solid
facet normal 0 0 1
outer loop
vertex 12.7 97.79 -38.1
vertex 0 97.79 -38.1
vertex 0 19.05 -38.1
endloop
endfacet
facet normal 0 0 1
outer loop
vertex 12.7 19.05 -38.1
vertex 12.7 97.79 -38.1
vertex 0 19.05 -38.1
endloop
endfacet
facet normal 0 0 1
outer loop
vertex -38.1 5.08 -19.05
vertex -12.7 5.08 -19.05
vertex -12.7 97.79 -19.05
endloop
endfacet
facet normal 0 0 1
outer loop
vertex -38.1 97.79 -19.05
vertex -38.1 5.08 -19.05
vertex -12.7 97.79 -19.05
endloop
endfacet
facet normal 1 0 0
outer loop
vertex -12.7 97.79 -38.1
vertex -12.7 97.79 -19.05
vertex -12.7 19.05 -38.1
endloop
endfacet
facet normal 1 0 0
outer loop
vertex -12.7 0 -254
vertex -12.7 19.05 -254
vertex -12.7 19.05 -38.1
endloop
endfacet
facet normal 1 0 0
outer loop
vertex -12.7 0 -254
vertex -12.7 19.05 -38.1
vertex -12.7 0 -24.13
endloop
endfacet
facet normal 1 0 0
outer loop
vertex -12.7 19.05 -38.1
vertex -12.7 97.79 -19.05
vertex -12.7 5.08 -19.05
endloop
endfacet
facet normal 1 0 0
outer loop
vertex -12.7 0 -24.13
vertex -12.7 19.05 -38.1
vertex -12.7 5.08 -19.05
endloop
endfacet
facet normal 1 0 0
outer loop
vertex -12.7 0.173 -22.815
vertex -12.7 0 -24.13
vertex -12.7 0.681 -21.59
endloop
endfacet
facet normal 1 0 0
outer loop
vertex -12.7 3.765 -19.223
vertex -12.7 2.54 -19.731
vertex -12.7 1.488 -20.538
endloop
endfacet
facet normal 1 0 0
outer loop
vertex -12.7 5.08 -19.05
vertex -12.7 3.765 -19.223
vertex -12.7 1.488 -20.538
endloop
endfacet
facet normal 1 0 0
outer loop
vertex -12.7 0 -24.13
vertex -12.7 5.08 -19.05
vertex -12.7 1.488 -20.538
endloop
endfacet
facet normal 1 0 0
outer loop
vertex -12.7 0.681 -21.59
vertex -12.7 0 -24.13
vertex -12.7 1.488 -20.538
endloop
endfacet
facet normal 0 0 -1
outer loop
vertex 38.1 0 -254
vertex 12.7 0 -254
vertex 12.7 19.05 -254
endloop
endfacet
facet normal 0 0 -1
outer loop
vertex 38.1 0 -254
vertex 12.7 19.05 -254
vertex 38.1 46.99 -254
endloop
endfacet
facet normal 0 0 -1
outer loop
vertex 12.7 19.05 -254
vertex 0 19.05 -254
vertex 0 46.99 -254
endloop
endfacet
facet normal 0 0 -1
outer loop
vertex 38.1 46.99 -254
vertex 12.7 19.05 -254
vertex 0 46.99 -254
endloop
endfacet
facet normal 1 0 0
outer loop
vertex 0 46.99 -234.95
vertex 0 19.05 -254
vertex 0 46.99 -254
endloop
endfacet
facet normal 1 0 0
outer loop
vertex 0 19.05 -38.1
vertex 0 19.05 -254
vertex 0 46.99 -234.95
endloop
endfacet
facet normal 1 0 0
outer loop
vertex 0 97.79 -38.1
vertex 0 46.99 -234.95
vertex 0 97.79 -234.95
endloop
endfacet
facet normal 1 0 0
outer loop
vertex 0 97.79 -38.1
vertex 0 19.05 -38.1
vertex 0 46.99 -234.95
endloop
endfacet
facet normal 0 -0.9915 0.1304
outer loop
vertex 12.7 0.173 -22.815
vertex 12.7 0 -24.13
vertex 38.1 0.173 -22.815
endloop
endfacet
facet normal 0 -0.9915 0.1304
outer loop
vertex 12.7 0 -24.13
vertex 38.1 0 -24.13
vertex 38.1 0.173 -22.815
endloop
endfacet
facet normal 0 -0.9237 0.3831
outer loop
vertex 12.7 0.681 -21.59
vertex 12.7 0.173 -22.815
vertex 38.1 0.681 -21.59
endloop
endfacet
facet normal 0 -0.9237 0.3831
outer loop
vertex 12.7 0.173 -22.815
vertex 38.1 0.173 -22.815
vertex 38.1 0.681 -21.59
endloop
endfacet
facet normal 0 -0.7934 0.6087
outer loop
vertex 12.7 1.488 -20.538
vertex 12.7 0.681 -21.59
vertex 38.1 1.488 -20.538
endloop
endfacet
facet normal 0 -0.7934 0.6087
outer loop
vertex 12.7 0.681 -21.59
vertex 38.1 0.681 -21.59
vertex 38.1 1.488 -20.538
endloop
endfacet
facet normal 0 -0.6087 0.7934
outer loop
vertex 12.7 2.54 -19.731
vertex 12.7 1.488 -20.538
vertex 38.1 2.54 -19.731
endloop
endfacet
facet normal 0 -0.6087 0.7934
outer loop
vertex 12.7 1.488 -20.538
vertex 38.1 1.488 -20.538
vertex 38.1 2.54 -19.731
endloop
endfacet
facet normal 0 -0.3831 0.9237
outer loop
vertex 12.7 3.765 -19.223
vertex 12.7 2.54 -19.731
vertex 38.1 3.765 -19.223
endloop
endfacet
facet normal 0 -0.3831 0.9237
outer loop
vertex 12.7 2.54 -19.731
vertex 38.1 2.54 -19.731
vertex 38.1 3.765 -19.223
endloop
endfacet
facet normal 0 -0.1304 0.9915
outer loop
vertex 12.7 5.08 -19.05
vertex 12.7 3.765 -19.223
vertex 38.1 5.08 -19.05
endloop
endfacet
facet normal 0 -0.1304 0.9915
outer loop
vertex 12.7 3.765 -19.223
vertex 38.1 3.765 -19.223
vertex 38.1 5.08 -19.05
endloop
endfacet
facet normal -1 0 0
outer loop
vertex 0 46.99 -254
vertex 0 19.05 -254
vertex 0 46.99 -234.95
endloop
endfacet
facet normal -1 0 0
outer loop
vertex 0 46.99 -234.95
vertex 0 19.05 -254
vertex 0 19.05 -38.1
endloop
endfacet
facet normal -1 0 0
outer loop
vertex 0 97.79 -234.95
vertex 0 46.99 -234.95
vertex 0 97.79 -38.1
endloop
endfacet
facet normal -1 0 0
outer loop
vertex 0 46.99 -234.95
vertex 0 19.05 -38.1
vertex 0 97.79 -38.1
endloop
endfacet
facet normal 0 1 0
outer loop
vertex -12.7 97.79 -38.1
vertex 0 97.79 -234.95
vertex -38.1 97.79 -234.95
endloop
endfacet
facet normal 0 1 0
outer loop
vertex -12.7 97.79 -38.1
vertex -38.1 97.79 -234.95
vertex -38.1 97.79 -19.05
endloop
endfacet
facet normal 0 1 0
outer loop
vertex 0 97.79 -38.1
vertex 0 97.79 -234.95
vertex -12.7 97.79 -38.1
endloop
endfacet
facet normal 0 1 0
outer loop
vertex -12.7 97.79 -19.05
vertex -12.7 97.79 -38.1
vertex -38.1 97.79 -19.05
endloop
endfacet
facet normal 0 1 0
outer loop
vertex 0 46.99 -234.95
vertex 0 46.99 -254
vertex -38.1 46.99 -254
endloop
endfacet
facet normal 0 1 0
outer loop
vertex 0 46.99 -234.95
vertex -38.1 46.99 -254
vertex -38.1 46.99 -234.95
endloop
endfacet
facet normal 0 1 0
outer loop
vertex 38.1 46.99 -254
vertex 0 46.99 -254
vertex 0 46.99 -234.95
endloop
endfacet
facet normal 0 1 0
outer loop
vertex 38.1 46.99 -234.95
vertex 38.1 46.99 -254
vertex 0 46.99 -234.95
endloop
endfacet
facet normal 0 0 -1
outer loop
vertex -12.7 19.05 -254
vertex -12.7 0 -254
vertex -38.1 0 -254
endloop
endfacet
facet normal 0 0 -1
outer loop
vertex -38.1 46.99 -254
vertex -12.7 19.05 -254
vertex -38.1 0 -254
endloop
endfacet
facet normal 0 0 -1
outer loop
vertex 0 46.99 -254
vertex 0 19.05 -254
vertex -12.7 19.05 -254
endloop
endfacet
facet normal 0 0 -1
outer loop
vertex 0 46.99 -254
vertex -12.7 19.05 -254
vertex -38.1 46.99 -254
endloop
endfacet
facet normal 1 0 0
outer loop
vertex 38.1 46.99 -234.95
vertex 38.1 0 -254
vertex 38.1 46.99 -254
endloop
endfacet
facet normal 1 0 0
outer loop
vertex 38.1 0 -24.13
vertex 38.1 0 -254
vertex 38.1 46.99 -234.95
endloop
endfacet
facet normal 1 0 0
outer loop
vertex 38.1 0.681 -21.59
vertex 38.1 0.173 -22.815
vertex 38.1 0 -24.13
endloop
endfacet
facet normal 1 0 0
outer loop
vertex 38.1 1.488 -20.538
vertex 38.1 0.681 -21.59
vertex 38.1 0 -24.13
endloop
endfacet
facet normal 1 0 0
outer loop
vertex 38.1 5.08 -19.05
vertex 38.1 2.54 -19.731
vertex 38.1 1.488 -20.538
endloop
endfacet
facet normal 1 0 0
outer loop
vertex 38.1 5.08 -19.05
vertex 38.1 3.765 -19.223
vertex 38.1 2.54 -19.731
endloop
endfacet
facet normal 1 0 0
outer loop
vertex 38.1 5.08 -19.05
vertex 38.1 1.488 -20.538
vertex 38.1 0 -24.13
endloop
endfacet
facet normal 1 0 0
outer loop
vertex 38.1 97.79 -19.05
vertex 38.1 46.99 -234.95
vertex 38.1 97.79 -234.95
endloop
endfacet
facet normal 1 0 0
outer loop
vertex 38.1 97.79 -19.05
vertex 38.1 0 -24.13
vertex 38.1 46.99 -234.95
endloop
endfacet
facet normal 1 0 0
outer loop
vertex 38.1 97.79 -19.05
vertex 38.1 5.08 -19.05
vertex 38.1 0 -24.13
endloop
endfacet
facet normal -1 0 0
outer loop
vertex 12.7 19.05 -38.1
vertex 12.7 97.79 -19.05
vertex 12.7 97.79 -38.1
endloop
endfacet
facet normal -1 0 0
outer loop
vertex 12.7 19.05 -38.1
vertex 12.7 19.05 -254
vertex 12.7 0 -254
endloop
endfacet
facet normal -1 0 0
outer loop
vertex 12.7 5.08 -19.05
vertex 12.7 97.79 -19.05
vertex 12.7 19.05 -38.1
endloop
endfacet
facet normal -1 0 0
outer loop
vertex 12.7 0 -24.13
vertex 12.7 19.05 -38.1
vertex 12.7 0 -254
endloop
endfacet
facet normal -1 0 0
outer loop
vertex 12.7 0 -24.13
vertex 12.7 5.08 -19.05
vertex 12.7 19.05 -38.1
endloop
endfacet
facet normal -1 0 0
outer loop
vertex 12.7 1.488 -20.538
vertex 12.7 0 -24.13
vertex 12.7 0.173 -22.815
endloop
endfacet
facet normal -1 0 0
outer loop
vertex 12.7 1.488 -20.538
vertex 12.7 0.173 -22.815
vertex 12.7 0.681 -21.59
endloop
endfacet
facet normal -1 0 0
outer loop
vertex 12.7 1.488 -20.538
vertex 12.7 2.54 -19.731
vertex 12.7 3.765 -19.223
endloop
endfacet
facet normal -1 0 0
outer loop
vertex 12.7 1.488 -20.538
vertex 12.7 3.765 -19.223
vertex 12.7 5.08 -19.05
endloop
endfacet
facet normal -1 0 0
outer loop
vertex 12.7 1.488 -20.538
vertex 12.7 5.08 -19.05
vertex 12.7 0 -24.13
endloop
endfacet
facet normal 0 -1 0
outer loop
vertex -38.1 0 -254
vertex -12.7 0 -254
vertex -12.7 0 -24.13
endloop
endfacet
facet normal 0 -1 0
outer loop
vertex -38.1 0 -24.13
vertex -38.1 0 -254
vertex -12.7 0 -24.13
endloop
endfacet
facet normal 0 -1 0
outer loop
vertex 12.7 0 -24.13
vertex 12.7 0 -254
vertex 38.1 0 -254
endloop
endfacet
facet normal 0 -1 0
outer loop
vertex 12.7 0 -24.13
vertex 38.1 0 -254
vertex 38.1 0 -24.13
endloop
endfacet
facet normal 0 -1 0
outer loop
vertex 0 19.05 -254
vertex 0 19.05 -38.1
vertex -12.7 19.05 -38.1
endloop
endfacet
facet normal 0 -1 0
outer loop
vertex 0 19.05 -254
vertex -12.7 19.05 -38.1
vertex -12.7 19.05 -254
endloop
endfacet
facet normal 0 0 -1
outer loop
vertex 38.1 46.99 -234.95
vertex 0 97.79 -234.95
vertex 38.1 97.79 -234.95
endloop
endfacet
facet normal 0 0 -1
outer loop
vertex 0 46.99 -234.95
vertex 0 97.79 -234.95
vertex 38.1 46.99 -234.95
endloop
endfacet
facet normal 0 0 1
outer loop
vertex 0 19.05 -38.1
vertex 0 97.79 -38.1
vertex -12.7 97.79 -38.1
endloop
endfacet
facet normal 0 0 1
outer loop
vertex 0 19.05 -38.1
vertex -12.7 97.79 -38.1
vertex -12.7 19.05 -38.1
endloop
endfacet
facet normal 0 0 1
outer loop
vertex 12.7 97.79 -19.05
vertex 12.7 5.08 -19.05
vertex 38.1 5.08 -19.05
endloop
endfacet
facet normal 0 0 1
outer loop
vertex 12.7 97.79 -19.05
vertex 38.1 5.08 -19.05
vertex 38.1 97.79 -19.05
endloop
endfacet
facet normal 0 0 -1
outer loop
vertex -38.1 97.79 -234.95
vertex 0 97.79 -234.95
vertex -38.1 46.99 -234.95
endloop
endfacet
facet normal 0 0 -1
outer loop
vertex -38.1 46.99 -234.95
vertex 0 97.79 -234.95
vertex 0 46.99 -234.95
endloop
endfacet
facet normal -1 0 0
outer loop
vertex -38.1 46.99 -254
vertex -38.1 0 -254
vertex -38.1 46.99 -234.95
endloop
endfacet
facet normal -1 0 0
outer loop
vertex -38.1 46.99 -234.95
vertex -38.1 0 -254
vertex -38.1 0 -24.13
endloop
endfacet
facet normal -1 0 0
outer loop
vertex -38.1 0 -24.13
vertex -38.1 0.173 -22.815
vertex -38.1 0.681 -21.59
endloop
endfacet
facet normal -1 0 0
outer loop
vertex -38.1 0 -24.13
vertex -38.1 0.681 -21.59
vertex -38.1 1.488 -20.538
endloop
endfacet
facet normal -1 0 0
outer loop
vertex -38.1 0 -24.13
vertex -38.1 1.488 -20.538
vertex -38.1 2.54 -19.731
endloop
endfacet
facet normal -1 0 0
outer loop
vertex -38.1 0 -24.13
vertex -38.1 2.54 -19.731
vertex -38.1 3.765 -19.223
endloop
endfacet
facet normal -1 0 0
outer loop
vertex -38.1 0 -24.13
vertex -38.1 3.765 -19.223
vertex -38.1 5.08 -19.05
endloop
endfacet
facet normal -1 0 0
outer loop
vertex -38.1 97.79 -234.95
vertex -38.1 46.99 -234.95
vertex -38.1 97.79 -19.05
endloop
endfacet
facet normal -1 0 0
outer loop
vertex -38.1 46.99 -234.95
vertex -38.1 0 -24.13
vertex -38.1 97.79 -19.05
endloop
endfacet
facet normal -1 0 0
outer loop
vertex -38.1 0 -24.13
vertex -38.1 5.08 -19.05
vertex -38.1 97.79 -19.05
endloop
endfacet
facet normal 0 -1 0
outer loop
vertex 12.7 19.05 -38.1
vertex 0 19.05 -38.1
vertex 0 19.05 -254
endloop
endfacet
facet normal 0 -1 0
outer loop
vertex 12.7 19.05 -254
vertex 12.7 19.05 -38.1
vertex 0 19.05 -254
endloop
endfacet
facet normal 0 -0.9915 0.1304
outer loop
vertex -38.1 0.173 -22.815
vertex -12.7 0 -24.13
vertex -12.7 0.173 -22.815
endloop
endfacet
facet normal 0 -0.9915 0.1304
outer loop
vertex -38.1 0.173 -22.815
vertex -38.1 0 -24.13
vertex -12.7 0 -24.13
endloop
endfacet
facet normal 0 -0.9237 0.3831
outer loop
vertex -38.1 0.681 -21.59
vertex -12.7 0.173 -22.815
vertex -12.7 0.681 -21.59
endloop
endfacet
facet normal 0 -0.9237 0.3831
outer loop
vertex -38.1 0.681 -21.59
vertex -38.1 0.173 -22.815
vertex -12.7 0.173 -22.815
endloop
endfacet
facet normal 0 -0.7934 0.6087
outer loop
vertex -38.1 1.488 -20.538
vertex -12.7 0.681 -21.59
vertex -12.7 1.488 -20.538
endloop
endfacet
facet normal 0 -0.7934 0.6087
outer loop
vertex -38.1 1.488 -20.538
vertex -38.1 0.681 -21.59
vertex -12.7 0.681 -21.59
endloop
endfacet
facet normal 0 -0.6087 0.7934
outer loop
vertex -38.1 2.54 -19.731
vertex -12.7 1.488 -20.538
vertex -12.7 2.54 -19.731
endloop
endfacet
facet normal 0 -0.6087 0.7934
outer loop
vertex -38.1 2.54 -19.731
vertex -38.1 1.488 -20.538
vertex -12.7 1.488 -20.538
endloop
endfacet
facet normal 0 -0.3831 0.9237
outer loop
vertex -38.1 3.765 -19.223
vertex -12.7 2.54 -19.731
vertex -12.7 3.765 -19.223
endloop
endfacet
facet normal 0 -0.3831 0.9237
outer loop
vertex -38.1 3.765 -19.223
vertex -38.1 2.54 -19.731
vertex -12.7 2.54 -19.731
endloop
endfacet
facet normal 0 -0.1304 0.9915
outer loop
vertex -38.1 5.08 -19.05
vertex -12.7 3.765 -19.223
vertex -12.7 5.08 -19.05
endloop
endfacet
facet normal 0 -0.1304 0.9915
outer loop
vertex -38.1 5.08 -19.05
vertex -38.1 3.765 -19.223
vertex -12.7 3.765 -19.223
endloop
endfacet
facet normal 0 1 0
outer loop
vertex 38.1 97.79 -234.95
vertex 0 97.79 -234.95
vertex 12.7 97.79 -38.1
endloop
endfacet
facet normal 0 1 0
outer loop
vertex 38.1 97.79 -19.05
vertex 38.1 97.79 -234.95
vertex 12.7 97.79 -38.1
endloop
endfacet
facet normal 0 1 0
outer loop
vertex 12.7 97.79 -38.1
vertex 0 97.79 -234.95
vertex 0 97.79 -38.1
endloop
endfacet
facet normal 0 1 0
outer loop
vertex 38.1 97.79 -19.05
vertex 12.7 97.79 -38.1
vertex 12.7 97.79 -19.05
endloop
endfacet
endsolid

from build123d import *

# Parameters (mm, degrees)
F0_W     = 97.79
F0_H     = 234.95
F1_DEPTH = 38.1
F2_W     = 19.05
F2_H     = 215.9
F2_H_2   = 19.05
F2_W_2   = 78.74
F3_DEPTH = 12.7
F2_W_3   = 50.8
F4_DEPTH = 38.101
F5_R     = 5.08


with BuildPart() as f1:
    # F0 (on Right) → F1 (new body)
    with BuildSketch(Plane.YZ):
        with Locations((48.895, -136.525)):
            Rectangle(F0_W, F0_H)
    extrude(amount=F1_DEPTH)

    # F2 (on face) → F3 (cut)
    with BuildSketch(Plane(origin=(0, 0, 0), x_dir=(0, -1, 0), z_dir=(-1, 0, 0))):
        with Locations((-9.525, -146.05)):
            Rectangle(F2_W, F2_H)
        with Locations((-9.525, -28.575)):
            Rectangle(F2_W, F2_H_2)
        with Locations((-58.42, -28.575)):
            Rectangle(F2_W_2, F2_H_2)
    extrude(amount=-F3_DEPTH, mode=Mode.SUBTRACT)

    # F2 (on face) → F4 (cut, through all)
    with BuildSketch(Plane(origin=(0, 0, 0), x_dir=(0, -1, 0), z_dir=(-1, 0, 0))):
        with Locations((-72.39, -244.475)):
            Rectangle(F2_W_3, F2_H_2)
    extrude(amount=-F4_DEPTH, mode=Mode.SUBTRACT)

    # F5
    f5_edges = [f1.edges().sort_by_distance(p)[0] for p in [
        (25.4, 0, -19.05),
    ]]
    fillet(f5_edges, radius=F5_R)


with BuildPart() as f6_1:
    # F6: instance of F1
    add(f1.part.mirror(Plane.YZ))


solid = Compound([f1.part, f6_1.part])
